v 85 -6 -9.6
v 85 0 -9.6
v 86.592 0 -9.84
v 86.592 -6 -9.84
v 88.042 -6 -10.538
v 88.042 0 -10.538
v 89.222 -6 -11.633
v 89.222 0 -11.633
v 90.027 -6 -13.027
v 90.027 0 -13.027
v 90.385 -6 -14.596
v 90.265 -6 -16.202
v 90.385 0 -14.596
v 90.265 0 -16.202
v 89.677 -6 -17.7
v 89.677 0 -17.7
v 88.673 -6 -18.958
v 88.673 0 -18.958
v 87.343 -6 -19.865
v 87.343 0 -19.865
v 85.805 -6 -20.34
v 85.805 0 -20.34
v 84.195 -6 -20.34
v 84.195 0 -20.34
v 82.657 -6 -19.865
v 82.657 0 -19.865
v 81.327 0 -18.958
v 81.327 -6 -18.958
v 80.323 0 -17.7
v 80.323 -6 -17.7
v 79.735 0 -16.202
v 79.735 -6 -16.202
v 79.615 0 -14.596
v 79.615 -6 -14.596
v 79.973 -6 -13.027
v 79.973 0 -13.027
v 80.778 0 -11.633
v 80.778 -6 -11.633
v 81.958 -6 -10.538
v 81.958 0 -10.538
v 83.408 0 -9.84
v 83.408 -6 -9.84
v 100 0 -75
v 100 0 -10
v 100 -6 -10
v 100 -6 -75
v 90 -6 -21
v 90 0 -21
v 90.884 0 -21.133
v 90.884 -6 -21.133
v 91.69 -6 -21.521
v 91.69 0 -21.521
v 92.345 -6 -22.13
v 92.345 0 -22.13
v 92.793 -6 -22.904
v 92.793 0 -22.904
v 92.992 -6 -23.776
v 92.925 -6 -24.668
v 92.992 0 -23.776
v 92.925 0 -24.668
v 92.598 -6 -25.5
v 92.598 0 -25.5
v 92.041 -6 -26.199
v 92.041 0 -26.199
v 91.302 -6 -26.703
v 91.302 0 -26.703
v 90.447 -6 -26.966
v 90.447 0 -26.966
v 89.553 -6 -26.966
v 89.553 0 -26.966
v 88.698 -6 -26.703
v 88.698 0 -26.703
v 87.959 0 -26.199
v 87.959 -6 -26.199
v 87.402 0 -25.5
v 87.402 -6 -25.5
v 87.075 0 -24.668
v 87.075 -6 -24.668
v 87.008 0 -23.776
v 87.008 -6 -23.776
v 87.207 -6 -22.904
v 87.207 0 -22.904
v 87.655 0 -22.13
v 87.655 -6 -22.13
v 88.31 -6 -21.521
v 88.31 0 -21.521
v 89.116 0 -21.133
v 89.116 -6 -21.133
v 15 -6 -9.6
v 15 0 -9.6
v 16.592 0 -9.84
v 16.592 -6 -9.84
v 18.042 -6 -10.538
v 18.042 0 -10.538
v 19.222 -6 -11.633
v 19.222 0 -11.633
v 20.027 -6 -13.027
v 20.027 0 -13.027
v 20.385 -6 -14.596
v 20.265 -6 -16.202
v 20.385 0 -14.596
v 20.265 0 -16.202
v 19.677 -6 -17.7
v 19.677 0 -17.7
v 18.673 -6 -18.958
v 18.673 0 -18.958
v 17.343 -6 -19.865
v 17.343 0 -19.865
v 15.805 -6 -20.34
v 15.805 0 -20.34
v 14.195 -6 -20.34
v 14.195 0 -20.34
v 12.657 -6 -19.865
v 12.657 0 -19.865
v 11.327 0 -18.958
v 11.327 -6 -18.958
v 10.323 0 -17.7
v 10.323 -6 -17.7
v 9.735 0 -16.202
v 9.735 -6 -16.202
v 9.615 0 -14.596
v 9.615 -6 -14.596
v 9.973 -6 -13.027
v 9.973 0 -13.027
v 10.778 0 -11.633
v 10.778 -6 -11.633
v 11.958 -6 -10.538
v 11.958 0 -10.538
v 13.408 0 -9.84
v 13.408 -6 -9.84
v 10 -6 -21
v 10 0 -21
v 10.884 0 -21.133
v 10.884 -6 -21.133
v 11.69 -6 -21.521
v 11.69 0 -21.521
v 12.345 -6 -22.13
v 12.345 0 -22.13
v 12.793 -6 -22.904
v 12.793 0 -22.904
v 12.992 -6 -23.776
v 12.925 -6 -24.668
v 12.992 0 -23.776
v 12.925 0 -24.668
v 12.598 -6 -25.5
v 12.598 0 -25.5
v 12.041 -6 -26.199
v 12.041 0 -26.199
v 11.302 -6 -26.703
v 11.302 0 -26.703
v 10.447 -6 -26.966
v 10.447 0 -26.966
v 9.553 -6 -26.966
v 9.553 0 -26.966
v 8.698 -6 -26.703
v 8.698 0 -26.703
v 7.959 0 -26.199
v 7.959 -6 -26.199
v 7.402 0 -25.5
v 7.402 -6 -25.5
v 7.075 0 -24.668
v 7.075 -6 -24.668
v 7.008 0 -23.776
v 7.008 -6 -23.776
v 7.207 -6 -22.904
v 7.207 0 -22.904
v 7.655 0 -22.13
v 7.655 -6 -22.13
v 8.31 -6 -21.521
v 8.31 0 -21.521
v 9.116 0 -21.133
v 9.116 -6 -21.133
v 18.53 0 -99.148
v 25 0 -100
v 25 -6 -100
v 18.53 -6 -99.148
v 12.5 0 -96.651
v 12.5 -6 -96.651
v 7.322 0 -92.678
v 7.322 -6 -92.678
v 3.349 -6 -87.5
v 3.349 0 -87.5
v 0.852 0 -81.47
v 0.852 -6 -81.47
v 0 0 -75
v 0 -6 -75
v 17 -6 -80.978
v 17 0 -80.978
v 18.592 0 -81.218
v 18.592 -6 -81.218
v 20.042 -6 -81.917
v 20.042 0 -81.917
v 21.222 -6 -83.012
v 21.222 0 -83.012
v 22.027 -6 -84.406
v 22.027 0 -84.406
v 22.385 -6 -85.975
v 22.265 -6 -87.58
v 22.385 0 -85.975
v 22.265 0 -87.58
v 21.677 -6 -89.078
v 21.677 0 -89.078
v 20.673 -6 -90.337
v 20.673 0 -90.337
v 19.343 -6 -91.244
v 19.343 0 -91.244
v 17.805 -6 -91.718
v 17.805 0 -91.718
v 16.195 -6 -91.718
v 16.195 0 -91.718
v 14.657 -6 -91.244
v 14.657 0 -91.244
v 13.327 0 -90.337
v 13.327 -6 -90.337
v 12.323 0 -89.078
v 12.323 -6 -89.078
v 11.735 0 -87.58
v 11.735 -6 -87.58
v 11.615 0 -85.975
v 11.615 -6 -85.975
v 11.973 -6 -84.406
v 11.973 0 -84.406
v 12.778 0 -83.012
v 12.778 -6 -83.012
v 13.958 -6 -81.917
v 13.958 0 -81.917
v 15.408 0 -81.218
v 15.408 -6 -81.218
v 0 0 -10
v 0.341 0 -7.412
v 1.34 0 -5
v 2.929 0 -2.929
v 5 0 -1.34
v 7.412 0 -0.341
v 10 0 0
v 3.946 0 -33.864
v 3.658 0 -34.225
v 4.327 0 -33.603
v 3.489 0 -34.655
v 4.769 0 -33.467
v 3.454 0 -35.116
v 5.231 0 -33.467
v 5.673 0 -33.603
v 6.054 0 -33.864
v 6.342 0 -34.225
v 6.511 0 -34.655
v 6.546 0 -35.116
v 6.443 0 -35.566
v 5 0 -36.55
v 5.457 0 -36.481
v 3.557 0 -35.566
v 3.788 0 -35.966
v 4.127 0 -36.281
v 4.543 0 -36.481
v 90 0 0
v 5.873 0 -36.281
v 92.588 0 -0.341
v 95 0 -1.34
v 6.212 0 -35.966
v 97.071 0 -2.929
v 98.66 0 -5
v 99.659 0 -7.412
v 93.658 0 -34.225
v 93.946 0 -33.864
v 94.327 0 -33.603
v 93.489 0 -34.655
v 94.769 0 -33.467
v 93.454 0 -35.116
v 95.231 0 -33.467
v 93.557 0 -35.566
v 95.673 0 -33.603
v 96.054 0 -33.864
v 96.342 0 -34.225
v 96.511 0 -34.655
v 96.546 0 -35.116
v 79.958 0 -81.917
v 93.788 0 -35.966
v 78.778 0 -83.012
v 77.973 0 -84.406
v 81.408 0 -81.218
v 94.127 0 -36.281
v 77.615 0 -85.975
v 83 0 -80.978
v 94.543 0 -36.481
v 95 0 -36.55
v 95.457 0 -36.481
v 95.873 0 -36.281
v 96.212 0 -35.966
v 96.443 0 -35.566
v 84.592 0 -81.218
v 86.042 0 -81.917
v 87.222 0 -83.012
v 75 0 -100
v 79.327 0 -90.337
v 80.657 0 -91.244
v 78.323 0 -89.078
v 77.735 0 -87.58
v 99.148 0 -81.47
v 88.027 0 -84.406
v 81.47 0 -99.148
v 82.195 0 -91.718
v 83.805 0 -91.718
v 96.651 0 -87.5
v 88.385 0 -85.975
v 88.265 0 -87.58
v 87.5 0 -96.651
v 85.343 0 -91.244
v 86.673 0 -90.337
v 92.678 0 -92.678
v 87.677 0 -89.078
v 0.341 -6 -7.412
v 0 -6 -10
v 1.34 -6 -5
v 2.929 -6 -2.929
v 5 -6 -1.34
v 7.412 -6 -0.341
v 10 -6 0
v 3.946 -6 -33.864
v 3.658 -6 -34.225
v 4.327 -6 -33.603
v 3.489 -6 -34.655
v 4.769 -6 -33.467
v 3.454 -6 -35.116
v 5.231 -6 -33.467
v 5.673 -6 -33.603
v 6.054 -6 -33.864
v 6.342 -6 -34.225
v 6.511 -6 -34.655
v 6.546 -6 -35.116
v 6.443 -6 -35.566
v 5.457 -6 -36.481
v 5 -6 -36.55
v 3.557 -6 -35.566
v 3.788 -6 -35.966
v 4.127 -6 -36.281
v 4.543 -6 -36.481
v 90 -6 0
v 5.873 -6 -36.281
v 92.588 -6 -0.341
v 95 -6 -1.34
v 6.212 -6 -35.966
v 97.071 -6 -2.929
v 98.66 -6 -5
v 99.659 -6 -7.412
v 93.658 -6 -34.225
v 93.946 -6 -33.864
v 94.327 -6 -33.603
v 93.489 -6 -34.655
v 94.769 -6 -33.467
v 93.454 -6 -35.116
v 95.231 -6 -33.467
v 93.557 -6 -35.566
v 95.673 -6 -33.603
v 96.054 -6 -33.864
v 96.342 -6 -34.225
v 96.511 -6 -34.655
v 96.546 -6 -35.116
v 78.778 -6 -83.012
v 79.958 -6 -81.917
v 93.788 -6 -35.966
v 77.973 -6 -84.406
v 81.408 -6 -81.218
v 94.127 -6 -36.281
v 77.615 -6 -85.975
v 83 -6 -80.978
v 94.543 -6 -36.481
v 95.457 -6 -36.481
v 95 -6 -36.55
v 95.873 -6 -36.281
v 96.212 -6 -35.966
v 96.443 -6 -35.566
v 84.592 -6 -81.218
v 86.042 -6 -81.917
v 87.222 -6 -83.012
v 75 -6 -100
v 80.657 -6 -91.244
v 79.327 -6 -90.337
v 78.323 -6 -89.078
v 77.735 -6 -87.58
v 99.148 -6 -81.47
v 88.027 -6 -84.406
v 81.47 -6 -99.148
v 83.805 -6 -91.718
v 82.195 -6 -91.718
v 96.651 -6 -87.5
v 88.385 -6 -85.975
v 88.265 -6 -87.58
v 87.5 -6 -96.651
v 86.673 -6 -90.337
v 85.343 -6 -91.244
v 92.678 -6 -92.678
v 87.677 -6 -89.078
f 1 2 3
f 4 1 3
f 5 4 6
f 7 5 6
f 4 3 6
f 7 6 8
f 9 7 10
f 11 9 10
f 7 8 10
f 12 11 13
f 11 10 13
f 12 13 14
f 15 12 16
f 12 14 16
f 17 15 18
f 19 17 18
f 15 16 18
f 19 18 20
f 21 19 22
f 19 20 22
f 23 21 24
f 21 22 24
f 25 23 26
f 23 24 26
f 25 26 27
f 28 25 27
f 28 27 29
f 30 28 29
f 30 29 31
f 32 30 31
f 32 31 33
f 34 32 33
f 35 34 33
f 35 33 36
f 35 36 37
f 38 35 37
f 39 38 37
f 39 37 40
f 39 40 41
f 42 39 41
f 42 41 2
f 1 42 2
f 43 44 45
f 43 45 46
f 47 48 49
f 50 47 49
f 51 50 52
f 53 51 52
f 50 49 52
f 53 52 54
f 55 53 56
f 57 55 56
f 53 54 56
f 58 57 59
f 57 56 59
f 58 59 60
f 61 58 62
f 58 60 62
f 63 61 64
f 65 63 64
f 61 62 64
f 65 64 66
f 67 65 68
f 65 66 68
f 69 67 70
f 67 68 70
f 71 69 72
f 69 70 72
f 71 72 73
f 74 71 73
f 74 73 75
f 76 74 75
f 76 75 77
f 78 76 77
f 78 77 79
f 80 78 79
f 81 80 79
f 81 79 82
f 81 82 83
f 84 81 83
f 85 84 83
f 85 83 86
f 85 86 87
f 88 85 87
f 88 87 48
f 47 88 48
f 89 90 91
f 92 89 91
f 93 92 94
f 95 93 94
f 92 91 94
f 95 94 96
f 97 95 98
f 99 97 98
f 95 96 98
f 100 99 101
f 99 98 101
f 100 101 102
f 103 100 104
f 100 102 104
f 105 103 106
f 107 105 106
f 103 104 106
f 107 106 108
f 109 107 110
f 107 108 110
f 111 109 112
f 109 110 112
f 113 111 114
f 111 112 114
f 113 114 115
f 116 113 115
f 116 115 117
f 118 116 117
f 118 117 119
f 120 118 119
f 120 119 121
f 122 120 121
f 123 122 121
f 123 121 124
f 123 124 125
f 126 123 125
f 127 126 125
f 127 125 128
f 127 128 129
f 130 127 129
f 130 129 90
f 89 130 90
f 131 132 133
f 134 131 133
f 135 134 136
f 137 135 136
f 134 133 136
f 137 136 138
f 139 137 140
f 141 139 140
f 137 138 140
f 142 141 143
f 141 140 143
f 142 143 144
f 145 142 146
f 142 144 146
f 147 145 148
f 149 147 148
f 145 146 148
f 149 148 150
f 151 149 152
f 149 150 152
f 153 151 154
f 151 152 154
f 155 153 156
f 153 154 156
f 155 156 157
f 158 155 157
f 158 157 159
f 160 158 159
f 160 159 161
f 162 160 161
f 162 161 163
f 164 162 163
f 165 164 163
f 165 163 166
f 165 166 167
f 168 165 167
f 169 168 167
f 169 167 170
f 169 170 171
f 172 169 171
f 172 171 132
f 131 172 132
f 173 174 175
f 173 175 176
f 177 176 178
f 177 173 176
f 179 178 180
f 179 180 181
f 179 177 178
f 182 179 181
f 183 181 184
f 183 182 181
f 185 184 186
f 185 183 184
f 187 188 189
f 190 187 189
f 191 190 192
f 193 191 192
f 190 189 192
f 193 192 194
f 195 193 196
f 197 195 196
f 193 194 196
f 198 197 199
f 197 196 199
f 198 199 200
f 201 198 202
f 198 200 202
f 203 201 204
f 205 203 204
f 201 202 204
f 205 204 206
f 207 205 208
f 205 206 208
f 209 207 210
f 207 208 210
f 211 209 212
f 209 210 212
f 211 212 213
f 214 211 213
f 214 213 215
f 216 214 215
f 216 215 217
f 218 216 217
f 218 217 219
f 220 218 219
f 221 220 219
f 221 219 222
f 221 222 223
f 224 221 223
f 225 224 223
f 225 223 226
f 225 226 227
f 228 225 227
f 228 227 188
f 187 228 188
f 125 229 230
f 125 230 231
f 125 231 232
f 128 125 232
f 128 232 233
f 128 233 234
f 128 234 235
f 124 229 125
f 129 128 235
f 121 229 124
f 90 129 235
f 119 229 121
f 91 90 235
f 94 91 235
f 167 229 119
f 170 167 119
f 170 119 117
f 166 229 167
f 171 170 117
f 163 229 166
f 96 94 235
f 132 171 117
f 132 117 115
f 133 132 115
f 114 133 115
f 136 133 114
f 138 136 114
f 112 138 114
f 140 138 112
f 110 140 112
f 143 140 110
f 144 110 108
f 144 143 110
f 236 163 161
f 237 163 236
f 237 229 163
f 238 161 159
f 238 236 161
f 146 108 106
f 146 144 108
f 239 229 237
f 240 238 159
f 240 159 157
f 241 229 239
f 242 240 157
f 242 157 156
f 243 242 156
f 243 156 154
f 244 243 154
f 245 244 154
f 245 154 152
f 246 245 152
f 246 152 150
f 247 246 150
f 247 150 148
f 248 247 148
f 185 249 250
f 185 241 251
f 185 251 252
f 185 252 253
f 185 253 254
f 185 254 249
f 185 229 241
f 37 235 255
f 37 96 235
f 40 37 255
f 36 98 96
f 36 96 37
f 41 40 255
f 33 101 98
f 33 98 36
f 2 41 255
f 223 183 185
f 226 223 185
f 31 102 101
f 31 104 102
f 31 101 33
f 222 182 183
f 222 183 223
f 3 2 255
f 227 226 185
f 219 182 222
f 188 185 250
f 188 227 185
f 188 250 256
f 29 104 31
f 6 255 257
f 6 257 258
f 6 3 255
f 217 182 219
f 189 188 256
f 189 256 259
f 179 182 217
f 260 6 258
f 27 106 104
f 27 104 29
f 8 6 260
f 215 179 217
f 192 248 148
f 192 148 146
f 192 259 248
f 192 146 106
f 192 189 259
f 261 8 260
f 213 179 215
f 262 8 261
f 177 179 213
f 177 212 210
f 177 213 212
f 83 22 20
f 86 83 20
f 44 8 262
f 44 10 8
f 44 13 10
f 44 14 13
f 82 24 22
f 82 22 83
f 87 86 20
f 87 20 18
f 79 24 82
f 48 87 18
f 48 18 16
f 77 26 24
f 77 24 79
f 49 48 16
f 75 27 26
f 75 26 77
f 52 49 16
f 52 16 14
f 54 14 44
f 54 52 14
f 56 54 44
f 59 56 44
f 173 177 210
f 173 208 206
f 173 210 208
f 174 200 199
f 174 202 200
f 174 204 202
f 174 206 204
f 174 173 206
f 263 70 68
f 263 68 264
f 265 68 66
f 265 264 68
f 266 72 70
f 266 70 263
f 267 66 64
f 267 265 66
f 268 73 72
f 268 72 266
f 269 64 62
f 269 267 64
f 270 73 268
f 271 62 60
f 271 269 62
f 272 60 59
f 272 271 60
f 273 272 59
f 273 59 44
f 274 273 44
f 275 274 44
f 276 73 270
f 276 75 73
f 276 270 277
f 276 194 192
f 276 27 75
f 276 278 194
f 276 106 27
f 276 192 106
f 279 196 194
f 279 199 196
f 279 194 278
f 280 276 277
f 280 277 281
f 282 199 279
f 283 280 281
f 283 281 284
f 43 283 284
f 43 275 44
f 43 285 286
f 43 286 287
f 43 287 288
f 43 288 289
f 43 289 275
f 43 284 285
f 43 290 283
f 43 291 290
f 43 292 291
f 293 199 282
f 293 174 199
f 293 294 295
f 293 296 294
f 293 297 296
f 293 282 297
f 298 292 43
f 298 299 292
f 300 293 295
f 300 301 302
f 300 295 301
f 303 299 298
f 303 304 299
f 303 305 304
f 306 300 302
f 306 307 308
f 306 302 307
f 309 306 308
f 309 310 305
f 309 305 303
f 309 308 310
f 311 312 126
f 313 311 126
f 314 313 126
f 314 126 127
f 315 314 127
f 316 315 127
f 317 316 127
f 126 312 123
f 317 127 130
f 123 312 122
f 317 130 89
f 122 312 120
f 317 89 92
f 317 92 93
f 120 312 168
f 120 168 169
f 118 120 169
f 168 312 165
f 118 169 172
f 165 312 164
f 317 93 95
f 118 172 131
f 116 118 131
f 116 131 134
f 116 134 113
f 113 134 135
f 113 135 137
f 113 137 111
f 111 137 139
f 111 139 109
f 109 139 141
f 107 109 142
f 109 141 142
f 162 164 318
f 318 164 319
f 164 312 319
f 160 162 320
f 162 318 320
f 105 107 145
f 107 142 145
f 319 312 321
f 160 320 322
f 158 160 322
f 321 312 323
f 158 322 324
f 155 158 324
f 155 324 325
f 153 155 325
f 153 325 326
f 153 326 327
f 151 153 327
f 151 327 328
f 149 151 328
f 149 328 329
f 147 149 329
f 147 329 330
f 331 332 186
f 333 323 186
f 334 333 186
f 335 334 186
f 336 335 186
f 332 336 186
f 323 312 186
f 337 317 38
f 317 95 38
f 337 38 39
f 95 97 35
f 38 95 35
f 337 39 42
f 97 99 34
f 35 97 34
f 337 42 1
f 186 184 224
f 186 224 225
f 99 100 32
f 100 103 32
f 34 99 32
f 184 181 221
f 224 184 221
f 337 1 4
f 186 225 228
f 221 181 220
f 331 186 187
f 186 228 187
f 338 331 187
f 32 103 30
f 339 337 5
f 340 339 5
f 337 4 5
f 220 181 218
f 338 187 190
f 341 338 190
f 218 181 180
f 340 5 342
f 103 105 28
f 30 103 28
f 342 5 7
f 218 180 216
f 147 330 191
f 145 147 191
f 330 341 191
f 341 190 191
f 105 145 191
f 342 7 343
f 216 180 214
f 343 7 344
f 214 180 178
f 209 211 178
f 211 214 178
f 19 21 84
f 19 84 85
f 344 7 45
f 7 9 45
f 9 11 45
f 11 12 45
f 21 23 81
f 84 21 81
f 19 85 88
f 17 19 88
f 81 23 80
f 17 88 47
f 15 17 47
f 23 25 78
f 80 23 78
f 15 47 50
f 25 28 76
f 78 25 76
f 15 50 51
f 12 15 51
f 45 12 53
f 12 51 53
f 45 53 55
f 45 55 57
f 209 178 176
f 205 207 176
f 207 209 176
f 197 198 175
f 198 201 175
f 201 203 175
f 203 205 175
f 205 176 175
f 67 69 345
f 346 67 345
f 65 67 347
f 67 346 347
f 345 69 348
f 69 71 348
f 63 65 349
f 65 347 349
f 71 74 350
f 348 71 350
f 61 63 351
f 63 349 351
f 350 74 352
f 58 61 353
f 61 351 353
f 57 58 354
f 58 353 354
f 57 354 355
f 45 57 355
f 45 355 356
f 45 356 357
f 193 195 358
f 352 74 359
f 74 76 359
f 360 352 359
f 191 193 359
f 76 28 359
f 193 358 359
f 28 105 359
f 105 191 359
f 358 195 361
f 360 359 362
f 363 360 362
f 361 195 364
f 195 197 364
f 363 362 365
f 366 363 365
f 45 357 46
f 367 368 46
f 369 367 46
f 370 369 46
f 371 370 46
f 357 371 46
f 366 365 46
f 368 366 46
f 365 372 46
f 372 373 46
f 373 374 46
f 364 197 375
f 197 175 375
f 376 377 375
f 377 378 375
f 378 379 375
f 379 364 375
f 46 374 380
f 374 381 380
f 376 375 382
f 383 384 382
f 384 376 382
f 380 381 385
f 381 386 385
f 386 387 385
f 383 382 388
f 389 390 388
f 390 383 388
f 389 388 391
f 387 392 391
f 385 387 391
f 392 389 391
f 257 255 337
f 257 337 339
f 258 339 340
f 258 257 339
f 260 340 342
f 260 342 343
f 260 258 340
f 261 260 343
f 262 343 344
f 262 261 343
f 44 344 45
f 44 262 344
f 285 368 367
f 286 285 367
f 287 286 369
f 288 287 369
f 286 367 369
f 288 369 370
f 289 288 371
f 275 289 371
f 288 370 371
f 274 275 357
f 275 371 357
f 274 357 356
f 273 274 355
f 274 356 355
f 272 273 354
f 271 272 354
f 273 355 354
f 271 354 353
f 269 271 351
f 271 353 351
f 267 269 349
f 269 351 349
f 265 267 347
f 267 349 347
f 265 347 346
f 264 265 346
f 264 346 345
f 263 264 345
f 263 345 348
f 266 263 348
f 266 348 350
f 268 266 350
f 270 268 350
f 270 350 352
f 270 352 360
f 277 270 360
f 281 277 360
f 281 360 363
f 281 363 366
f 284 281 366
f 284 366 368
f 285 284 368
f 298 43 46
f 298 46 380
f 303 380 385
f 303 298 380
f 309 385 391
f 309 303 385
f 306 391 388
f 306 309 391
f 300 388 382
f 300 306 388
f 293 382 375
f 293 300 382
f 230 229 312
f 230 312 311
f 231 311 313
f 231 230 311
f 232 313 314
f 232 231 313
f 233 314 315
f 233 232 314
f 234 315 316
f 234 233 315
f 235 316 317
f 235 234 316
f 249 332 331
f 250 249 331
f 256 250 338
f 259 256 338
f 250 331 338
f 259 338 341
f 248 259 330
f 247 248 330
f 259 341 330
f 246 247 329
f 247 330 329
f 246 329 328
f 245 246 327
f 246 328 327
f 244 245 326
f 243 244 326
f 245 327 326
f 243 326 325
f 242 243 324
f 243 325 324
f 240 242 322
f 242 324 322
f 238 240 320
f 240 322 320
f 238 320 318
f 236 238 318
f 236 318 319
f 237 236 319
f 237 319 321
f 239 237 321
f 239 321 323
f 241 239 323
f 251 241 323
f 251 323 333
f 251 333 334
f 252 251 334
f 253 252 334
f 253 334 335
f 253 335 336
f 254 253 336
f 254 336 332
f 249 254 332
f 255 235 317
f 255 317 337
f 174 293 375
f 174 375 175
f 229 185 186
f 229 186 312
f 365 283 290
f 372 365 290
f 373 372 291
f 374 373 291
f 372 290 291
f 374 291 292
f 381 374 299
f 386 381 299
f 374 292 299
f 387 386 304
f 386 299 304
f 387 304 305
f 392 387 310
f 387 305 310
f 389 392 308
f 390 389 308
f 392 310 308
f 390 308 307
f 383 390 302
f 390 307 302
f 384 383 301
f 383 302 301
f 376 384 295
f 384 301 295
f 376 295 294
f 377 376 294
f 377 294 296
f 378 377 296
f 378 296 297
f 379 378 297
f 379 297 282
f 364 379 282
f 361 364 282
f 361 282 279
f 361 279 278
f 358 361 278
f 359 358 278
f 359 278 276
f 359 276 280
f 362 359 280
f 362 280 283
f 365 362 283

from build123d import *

# Parameters (mm, degrees)
DODANIE_WYCI_GNI_CIE1_DEPTH = 6
SZKIC2_R                    = 5.4
WYTNIJ_WYCI_GNI_CIE1_DEPTH  = 142.548578234
SZKIC3_R                    = 1.55
WYTNIJ_WYCI_GNI_CIE2_DEPTH  = 142.548578234
SZKIC4_R                    = 3
WYTNIJ_WYCI_GNI_CIE3_DEPTH  = 142.548578234


with BuildPart() as part:
    # Szkic1 → Dodanie-wyciągnięcie1 (new body)
    with BuildSketch(Plane(origin=(0, 0, 0), x_dir=(1, 0, 0), z_dir=(0, 1, 0))):
        with BuildLine():
            Line((10, 0), (90, 0))
            ThreePointArc((90, 0), (97.071067812, 2.928932188), (100, 10))
            Line((100, 10), (100, 75))
            ThreePointArc((100, 75), (92.67766953, 92.67766953), (75, 100))
            Line((75, 100), (25, 100))
            ThreePointArc((25, 100), (7.32233047, 92.67766953), (0, 75))
            Line((0, 75), (0, 10))
            ThreePointArc((0, 10), (2.928932188, 2.928932188), (10, 0))
        make_face()
    extrude(amount=-DODANIE_WYCI_GNI_CIE1_DEPTH)

    # Szkic2 → Wytnij-wyciągnięcie1 (cut, through all)
    with BuildSketch(Plane(origin=(0, 0, 0), x_dir=(1, 0, 0), z_dir=(0, 1, 0))):
        with Locations(Location((17, 86.378345537, 0), (0, 0, 270))):
            Circle(SZKIC2_R)
        with Locations(Location((83, 86.378345537, 0), (0, 0, 270))):
            Circle(SZKIC2_R)
        with Locations(Location((15, 15, 0), (0, 0, 270))):
            Circle(SZKIC2_R)
        with Locations(Location((85, 15, 0), (0, 0, 270))):
            Circle(SZKIC2_R)
    extrude(amount=-WYTNIJ_WYCI_GNI_CIE1_DEPTH, mode=Mode.SUBTRACT)

    # Szkic3 → Wytnij-wyciągnięcie2 (cut, through all)
    with BuildSketch(Plane.XZ.offset(6)):
        with Locations(Location((5, -35, 0), (0, 0, 270))):
            Circle(SZKIC3_R)
        with Locations(Location((95, -35, 0), (0, 0, 270))):
            Circle(SZKIC3_R)
    extrude(amount=-WYTNIJ_WYCI_GNI_CIE2_DEPTH, mode=Mode.SUBTRACT)

    # Szkic4 → Wytnij-wyciągnięcie3 (cut, through all)
    with BuildSketch(Plane(origin=(0, 0, 0), x_dir=(1, 0, 0), z_dir=(0, 1, 0))):
        with Locations(Location((90, 24, 0), (0, 0, 270))):
            Circle(SZKIC4_R)
        with Locations(Location((10, 24, 0), (0, 0, 270))):
            Circle(SZKIC4_R)
    extrude(amount=-WYTNIJ_WYCI_GNI_CIE3_DEPTH, mode=Mode.SUBTRACT)


solid = part.part
